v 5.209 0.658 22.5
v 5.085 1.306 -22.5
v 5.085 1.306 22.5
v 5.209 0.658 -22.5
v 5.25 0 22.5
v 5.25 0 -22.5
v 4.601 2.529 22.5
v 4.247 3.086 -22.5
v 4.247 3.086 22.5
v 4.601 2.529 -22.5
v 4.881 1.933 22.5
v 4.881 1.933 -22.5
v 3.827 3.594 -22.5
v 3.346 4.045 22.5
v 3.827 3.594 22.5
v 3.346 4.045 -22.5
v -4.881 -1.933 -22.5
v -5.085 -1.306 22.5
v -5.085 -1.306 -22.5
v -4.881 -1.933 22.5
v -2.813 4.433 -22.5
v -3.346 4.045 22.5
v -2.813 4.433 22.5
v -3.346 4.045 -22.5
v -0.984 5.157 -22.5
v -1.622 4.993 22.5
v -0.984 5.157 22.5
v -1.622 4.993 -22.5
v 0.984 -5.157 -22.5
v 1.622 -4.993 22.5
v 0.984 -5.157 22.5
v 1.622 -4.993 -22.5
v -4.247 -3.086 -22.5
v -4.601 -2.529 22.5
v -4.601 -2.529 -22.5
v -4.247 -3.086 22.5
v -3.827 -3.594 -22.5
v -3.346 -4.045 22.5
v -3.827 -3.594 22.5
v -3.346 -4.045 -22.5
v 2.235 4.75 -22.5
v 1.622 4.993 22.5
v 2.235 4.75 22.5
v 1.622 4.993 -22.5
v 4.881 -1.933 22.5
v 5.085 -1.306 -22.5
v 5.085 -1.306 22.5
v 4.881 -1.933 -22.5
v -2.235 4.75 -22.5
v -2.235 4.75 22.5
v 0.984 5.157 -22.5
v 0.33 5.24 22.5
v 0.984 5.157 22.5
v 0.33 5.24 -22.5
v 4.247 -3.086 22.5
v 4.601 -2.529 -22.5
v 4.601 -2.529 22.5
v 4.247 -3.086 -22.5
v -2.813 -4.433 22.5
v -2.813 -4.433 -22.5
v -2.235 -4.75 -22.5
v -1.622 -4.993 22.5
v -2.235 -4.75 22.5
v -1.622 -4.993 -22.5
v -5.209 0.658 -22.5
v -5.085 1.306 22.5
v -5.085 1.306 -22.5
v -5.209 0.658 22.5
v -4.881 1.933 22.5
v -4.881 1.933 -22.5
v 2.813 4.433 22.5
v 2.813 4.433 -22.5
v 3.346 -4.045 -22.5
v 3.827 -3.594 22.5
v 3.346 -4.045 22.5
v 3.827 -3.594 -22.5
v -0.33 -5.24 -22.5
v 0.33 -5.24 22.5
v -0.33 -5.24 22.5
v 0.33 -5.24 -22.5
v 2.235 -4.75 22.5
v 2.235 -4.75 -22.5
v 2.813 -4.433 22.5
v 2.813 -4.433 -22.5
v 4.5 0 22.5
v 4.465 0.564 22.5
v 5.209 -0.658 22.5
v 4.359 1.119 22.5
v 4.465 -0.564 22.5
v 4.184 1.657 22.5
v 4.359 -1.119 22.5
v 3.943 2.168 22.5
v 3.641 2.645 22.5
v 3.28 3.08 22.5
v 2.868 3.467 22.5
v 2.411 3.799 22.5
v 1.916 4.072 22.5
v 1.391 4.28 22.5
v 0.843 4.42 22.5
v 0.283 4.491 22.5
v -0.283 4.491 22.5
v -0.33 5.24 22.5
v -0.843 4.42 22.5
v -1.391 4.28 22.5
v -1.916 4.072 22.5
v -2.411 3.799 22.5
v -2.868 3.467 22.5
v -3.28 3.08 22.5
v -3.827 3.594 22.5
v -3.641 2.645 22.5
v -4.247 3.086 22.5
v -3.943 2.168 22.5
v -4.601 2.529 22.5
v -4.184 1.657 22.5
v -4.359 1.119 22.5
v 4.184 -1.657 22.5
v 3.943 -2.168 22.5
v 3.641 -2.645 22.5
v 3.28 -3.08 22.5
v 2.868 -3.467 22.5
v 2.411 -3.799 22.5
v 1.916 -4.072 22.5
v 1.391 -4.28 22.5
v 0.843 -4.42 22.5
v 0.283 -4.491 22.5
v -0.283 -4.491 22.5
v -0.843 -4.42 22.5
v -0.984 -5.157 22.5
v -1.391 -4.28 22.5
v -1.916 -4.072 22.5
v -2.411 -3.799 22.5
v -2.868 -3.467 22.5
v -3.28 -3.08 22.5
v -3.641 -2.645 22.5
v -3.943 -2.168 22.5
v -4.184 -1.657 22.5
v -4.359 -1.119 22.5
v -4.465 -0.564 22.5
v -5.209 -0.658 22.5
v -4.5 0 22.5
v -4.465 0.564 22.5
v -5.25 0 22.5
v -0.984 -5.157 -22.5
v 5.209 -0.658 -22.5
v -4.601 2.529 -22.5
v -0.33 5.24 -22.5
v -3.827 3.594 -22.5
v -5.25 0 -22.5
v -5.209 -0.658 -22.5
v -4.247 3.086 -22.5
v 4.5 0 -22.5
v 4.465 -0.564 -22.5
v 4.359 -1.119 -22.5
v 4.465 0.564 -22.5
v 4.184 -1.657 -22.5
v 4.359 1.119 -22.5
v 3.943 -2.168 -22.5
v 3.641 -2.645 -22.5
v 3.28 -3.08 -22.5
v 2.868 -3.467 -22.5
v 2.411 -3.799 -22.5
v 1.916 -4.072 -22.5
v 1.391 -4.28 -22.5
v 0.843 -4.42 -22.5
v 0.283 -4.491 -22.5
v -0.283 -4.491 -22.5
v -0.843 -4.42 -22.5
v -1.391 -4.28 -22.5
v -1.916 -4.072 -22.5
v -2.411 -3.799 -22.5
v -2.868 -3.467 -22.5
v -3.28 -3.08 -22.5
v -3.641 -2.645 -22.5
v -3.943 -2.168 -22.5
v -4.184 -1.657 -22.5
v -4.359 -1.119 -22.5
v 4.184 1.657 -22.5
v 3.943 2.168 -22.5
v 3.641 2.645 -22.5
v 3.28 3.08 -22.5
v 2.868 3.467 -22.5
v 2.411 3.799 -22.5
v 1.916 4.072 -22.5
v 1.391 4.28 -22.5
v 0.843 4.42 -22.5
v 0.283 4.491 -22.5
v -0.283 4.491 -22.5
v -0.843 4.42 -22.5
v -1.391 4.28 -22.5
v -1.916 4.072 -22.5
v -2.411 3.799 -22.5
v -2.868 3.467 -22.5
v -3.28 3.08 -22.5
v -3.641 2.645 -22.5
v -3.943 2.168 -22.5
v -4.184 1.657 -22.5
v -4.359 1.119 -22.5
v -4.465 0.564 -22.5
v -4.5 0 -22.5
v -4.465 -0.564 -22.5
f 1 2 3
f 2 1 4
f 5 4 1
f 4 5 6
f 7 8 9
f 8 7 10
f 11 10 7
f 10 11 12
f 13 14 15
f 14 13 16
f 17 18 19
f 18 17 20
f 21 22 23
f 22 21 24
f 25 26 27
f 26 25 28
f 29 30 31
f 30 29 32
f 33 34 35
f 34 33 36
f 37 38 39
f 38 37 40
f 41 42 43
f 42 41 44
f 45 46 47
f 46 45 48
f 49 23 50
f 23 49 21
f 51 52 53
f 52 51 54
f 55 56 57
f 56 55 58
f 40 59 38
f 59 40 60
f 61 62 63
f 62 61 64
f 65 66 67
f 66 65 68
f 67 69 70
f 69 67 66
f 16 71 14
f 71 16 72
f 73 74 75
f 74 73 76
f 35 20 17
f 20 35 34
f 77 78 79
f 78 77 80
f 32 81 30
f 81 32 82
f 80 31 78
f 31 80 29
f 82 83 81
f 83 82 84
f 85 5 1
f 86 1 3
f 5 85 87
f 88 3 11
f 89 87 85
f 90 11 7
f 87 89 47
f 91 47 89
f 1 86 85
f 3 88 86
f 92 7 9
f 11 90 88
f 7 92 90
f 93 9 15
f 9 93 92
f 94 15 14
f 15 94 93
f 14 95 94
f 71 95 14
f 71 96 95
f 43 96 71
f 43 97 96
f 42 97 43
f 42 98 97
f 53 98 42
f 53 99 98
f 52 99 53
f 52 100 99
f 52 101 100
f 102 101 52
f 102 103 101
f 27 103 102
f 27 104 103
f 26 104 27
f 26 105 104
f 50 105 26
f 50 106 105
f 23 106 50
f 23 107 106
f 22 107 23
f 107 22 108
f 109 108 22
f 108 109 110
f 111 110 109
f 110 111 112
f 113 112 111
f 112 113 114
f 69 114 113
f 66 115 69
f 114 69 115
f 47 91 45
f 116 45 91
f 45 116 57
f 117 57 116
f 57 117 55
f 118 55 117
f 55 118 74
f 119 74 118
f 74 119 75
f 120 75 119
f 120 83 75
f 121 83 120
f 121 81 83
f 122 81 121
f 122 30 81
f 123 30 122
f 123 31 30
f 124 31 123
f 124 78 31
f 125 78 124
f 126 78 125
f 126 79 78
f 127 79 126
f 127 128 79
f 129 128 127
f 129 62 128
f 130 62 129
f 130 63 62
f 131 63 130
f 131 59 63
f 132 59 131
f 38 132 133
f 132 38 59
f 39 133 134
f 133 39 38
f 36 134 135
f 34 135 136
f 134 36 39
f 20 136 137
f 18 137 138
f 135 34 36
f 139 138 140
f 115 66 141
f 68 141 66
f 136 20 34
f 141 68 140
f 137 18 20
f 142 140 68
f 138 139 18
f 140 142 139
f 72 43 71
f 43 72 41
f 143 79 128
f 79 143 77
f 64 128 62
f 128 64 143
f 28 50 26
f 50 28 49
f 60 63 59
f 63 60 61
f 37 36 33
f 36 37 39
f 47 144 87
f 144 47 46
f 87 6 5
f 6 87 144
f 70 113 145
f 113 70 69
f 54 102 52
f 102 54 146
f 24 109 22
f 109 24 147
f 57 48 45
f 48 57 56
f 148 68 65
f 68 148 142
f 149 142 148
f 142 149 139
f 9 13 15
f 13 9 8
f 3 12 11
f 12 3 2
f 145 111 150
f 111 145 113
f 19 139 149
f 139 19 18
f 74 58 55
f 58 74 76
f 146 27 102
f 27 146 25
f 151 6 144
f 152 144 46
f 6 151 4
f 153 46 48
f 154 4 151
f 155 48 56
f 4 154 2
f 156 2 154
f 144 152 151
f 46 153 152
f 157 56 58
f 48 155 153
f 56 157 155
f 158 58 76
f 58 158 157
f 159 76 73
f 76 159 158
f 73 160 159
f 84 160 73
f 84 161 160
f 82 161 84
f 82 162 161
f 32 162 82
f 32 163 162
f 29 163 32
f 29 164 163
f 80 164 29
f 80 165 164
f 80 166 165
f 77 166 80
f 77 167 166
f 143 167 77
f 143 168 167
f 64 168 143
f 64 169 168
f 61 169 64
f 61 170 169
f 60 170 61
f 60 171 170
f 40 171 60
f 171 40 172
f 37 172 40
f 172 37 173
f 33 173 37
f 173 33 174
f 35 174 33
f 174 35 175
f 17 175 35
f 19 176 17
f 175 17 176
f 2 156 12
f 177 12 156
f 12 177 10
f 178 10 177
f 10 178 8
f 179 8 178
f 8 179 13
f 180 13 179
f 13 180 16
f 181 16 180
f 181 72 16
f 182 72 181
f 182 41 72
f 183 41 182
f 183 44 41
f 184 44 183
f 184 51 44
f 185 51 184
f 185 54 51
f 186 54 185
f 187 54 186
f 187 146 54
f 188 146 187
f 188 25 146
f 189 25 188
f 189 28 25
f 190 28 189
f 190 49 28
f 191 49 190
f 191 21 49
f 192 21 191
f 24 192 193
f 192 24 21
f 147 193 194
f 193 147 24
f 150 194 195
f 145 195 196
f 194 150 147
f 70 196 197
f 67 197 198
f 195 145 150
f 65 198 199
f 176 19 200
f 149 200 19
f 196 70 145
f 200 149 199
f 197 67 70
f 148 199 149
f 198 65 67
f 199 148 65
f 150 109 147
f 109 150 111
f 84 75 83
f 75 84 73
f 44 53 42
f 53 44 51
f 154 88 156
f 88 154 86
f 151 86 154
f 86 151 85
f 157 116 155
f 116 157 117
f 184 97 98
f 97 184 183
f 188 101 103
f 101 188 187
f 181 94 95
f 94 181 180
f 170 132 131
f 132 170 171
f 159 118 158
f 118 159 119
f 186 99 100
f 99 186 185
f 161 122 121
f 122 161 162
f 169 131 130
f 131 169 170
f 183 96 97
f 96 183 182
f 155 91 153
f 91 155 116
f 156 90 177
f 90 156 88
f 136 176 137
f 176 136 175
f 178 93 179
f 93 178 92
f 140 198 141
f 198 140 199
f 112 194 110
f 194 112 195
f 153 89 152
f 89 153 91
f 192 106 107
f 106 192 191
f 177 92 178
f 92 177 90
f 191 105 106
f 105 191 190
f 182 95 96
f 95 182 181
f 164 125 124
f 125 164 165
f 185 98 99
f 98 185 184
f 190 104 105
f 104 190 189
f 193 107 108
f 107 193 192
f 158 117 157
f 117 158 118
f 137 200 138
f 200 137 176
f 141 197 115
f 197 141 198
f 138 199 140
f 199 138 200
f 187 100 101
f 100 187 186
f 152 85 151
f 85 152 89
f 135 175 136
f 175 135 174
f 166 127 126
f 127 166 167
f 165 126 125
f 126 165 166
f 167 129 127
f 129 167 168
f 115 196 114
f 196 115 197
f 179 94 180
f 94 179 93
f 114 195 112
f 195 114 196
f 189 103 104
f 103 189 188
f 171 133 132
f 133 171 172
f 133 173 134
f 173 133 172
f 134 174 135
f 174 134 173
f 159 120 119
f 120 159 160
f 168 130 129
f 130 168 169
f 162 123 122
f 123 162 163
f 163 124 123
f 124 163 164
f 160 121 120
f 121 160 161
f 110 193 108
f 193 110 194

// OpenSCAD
$fn = 50;


difference() {
	union() {
		translate(v = [0, 0, -22.5000000000]) {
			cylinder(h = 45, r = 5.2500000000);
		}
	}
	union() {
		translate(v = [0, 0, -100.0000000000]) {
			cylinder(h = 200, r = 4.5000000000);
		}
	}
}
